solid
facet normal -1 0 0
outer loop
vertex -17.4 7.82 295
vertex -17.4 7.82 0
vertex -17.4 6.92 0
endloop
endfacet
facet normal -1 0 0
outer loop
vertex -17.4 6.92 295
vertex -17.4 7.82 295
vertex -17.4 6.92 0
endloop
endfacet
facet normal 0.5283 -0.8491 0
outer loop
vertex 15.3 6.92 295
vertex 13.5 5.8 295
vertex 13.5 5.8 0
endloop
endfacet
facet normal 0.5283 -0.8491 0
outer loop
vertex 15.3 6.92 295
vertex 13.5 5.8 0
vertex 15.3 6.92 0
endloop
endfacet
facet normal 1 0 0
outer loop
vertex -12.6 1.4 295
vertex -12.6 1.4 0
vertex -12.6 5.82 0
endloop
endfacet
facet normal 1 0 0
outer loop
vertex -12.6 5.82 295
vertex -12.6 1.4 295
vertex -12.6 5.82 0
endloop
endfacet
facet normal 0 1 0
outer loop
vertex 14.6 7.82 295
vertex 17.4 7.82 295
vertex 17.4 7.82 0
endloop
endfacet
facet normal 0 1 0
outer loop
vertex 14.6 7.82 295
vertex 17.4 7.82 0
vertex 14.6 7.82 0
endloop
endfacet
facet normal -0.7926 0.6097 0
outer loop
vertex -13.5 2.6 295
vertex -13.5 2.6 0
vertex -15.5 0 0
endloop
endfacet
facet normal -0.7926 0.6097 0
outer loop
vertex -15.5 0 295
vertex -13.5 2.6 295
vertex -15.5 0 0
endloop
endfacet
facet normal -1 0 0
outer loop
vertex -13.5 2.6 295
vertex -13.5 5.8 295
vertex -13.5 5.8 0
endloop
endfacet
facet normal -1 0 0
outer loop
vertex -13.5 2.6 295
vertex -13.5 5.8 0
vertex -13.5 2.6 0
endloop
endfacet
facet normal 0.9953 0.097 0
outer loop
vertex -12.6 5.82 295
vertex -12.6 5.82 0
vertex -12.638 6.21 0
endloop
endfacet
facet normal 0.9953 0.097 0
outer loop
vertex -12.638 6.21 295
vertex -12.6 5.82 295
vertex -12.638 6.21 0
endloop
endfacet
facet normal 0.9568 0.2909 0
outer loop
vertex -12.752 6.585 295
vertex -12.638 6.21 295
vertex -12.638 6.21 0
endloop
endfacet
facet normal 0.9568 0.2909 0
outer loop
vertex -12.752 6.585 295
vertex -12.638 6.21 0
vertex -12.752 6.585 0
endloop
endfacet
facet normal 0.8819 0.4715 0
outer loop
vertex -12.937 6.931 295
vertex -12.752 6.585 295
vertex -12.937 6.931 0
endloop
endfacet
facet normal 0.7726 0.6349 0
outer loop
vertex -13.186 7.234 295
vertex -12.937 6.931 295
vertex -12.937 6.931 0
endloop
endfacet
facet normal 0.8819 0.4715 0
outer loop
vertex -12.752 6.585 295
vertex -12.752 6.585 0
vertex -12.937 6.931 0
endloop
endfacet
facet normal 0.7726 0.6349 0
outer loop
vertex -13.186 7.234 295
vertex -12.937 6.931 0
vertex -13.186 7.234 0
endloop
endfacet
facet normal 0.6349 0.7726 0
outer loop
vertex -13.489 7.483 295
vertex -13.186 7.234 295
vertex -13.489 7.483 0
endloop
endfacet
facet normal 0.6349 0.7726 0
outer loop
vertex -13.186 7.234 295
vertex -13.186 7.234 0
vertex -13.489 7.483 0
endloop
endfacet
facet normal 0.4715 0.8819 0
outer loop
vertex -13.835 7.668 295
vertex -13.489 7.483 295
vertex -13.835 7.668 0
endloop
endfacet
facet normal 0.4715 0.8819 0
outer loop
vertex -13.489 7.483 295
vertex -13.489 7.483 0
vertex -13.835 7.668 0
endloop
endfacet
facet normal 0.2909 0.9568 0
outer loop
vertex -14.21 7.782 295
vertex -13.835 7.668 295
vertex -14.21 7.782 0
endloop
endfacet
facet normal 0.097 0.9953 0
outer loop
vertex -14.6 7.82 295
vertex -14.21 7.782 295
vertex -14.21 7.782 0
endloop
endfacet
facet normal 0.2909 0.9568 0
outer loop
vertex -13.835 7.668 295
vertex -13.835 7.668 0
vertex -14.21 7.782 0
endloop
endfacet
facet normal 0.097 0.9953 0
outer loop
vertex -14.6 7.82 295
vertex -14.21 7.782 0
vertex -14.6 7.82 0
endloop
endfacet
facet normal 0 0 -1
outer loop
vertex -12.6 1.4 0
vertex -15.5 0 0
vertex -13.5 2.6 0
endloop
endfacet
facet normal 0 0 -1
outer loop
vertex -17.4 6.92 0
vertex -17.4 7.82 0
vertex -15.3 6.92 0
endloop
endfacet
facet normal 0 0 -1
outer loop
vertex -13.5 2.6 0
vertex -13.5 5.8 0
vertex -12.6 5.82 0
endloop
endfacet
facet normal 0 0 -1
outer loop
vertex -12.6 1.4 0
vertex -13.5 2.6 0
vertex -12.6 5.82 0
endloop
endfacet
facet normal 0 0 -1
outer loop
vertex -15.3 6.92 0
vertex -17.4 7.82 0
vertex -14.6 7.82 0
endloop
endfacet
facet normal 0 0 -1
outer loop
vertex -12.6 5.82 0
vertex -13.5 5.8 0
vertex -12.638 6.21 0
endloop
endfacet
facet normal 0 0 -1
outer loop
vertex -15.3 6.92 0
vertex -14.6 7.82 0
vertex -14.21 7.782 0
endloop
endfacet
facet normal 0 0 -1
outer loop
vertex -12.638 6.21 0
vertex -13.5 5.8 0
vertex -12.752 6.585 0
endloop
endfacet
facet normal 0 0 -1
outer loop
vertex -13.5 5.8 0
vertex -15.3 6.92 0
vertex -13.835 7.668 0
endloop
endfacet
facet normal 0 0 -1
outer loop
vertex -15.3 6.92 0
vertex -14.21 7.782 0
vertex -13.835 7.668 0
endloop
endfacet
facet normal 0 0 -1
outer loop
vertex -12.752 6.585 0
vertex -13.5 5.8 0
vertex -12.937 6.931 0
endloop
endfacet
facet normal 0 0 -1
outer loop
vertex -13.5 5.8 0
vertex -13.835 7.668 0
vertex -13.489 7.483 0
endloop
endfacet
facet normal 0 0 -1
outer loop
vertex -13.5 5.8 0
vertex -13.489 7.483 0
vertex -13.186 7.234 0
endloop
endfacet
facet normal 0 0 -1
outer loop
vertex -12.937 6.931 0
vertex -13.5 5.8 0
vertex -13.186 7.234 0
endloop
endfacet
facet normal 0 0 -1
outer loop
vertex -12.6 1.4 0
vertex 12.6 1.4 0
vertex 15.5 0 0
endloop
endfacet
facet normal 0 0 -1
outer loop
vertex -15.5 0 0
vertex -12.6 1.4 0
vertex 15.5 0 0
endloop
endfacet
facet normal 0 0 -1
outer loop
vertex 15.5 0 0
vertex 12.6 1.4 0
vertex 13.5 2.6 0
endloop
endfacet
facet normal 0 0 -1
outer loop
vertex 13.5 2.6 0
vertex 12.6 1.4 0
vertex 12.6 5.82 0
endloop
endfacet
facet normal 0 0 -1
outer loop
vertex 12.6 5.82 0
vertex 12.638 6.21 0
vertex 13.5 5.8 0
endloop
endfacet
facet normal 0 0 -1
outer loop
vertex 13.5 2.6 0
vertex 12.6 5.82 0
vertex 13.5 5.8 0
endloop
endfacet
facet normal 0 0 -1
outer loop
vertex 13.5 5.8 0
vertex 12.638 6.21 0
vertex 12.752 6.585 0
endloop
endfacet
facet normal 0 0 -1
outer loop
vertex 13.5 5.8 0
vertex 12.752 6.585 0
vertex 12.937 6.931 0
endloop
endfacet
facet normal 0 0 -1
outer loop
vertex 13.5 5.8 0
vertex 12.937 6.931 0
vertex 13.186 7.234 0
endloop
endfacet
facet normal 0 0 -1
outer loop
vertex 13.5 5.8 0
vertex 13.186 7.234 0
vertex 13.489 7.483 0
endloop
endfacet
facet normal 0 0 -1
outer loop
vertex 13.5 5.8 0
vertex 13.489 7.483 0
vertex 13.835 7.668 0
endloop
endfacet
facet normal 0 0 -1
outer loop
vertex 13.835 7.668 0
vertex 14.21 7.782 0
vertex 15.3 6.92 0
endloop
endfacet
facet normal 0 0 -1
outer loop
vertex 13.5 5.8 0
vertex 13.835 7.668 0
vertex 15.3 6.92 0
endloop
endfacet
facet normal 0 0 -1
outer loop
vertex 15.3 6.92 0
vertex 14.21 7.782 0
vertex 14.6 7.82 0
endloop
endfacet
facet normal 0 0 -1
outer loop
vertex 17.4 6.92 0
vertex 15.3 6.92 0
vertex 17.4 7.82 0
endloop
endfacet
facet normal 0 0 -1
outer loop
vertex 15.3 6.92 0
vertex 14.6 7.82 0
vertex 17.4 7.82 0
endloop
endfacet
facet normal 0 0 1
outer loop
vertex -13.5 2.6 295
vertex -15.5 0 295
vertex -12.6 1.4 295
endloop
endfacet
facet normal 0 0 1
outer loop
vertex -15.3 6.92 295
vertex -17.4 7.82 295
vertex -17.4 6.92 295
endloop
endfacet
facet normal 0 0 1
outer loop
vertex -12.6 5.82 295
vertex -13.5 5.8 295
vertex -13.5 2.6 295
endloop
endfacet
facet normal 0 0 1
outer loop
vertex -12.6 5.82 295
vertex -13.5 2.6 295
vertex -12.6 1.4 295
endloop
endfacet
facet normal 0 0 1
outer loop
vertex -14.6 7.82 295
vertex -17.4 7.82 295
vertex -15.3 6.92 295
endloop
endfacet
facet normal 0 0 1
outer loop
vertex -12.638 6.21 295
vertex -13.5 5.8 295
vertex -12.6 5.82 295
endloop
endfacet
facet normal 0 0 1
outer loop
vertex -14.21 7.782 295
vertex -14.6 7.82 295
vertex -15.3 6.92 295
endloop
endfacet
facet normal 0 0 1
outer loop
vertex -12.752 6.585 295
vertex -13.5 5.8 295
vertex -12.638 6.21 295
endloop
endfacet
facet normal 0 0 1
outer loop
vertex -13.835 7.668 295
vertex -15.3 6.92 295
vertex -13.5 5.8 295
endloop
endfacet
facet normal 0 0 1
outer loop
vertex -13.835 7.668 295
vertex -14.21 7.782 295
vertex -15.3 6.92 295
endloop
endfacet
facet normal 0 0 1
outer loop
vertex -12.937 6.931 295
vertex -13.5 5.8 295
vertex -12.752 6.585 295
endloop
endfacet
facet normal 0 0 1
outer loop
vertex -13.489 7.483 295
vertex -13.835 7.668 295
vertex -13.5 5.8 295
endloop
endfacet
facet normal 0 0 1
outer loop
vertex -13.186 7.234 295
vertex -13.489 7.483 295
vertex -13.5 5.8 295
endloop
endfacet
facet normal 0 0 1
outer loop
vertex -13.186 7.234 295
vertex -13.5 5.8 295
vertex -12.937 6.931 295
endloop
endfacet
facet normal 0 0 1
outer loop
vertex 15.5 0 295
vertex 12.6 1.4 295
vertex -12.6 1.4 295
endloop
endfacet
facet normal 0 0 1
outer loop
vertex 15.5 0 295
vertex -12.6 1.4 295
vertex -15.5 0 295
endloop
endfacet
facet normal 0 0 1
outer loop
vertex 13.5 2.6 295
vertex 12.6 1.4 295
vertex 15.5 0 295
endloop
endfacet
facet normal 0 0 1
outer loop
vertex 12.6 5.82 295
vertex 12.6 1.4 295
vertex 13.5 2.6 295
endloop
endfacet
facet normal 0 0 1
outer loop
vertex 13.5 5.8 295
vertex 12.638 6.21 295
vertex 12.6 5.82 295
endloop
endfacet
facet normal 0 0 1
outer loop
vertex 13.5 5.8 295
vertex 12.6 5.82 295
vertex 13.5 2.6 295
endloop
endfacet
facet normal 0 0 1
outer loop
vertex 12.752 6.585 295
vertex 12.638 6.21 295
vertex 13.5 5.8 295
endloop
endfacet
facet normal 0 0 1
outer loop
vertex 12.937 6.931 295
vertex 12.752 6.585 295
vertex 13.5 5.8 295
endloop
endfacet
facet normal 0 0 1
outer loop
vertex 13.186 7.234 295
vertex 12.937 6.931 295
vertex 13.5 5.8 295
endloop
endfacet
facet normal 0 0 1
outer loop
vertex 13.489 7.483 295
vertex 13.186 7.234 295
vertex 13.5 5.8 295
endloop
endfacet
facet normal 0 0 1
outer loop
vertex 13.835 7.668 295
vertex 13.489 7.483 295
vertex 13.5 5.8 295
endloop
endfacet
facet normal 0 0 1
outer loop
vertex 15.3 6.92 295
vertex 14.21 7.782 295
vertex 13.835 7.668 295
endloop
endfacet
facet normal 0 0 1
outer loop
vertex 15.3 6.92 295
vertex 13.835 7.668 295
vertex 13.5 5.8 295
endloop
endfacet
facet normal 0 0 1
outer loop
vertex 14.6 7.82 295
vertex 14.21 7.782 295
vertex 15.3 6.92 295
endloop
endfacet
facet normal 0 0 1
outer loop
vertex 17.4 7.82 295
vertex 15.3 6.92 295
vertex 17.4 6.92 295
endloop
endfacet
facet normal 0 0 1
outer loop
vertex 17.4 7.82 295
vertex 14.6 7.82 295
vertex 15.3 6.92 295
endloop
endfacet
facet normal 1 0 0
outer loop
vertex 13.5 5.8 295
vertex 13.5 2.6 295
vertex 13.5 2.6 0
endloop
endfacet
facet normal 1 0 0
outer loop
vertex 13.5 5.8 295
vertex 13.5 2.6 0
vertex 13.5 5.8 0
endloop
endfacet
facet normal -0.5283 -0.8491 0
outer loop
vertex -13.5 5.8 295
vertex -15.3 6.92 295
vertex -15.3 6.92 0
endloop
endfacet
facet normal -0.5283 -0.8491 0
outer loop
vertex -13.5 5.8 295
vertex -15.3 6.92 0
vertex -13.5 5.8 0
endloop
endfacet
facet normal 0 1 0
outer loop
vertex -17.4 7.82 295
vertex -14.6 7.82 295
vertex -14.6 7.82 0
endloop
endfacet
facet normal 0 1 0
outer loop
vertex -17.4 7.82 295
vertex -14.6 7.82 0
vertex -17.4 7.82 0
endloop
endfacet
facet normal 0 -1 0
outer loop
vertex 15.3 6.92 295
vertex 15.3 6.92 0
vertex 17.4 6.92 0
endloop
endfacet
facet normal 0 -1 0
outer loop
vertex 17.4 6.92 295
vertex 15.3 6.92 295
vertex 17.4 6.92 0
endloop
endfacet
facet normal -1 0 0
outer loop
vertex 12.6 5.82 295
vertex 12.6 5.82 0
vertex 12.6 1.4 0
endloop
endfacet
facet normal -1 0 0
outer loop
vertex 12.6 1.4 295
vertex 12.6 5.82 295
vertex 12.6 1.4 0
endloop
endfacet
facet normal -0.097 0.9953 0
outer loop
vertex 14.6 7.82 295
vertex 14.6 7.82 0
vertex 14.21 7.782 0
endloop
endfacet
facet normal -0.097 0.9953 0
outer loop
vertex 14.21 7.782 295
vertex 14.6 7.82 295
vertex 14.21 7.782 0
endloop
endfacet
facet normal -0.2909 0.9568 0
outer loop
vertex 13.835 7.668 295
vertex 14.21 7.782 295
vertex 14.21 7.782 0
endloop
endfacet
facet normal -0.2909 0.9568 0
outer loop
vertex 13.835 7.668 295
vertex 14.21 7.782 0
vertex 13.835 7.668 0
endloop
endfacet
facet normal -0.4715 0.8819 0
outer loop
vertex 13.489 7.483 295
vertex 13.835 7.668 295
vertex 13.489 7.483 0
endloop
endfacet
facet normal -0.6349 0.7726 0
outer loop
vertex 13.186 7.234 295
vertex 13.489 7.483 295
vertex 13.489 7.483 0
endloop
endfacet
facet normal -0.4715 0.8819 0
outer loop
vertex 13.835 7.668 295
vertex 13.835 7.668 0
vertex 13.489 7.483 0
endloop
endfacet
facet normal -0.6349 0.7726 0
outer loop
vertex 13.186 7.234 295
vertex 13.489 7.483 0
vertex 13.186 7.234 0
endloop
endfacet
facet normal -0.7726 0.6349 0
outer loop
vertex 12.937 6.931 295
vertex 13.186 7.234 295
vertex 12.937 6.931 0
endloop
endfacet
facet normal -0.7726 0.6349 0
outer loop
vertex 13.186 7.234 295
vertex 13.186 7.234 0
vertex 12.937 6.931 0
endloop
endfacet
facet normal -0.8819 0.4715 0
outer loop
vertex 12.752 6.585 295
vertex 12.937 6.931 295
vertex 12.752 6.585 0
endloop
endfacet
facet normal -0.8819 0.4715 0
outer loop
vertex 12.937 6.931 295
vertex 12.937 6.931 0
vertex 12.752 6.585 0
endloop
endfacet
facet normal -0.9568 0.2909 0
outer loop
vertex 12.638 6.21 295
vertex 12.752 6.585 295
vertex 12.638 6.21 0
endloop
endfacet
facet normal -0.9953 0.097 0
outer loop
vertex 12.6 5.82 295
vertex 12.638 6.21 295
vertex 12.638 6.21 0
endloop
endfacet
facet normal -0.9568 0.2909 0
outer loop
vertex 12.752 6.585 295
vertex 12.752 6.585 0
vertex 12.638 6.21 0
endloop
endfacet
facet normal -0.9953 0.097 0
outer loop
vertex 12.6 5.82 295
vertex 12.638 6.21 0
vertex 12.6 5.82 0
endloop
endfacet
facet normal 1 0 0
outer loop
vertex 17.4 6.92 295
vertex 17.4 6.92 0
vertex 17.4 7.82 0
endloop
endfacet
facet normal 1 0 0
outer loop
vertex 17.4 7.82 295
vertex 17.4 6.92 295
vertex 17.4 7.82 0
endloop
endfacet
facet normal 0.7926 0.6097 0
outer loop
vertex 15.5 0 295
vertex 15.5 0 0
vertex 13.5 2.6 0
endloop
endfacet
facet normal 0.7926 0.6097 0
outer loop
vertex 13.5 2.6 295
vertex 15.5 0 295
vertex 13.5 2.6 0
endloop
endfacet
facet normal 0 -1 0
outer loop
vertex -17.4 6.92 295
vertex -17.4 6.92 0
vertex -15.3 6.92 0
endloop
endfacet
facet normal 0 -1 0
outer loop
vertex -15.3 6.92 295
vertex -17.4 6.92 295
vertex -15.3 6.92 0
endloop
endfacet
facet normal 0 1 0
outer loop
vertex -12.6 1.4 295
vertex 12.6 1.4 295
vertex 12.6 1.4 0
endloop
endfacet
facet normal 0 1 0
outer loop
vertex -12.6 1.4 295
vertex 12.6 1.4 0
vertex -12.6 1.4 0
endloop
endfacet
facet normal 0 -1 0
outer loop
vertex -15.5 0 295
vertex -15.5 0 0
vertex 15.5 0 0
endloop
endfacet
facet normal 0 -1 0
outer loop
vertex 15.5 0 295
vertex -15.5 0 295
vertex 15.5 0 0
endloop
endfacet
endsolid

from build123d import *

# Parameters (mm, degrees)
BOSS_EXTRUDE1_DEPTH = 295


with BuildPart() as part:
    # Sketch1 → Boss-Extrude1 (new body)
    with BuildSketch(Plane.XY):
        with BuildLine():
            Line((-15.5, 0), (15.5, 0))
            Line((15.5, 0), (13.5, 2.6))
            Line((13.5, 2.6), (13.5, 5.8))
            Line((13.5, 5.8), (15.3, 6.92))
            Line((15.3, 6.92), (17.4, 6.92))
            Line((17.4, 6.92), (17.4, 7.82))
            Line((17.4, 7.82), (14.6, 7.82))
            ThreePointArc((14.6, 7.82), (13.185786438, 7.234213562), (12.6, 5.82))
            Line((12.6, 5.82), (12.6, 1.4))
            Line((12.6, 1.4), (-12.6, 1.4))
            Line((-12.6, 1.4), (-12.6, 5.82))
            ThreePointArc((-12.6, 5.82), (-13.185786438, 7.234213562), (-14.6, 7.82))
            Line((-14.6, 7.82), (-17.4, 7.82))
            Line((-17.4, 7.82), (-17.4, 6.92))
            Line((-17.4, 6.92), (-15.3, 6.92))
            Line((-15.3, 6.92), (-13.5, 5.8))
            Line((-13.5, 5.8), (-13.5, 2.6))
            Line((-13.5, 2.6), (-15.5, 0))
        make_face()
    extrude(amount=BOSS_EXTRUDE1_DEPTH)


solid = part.part
